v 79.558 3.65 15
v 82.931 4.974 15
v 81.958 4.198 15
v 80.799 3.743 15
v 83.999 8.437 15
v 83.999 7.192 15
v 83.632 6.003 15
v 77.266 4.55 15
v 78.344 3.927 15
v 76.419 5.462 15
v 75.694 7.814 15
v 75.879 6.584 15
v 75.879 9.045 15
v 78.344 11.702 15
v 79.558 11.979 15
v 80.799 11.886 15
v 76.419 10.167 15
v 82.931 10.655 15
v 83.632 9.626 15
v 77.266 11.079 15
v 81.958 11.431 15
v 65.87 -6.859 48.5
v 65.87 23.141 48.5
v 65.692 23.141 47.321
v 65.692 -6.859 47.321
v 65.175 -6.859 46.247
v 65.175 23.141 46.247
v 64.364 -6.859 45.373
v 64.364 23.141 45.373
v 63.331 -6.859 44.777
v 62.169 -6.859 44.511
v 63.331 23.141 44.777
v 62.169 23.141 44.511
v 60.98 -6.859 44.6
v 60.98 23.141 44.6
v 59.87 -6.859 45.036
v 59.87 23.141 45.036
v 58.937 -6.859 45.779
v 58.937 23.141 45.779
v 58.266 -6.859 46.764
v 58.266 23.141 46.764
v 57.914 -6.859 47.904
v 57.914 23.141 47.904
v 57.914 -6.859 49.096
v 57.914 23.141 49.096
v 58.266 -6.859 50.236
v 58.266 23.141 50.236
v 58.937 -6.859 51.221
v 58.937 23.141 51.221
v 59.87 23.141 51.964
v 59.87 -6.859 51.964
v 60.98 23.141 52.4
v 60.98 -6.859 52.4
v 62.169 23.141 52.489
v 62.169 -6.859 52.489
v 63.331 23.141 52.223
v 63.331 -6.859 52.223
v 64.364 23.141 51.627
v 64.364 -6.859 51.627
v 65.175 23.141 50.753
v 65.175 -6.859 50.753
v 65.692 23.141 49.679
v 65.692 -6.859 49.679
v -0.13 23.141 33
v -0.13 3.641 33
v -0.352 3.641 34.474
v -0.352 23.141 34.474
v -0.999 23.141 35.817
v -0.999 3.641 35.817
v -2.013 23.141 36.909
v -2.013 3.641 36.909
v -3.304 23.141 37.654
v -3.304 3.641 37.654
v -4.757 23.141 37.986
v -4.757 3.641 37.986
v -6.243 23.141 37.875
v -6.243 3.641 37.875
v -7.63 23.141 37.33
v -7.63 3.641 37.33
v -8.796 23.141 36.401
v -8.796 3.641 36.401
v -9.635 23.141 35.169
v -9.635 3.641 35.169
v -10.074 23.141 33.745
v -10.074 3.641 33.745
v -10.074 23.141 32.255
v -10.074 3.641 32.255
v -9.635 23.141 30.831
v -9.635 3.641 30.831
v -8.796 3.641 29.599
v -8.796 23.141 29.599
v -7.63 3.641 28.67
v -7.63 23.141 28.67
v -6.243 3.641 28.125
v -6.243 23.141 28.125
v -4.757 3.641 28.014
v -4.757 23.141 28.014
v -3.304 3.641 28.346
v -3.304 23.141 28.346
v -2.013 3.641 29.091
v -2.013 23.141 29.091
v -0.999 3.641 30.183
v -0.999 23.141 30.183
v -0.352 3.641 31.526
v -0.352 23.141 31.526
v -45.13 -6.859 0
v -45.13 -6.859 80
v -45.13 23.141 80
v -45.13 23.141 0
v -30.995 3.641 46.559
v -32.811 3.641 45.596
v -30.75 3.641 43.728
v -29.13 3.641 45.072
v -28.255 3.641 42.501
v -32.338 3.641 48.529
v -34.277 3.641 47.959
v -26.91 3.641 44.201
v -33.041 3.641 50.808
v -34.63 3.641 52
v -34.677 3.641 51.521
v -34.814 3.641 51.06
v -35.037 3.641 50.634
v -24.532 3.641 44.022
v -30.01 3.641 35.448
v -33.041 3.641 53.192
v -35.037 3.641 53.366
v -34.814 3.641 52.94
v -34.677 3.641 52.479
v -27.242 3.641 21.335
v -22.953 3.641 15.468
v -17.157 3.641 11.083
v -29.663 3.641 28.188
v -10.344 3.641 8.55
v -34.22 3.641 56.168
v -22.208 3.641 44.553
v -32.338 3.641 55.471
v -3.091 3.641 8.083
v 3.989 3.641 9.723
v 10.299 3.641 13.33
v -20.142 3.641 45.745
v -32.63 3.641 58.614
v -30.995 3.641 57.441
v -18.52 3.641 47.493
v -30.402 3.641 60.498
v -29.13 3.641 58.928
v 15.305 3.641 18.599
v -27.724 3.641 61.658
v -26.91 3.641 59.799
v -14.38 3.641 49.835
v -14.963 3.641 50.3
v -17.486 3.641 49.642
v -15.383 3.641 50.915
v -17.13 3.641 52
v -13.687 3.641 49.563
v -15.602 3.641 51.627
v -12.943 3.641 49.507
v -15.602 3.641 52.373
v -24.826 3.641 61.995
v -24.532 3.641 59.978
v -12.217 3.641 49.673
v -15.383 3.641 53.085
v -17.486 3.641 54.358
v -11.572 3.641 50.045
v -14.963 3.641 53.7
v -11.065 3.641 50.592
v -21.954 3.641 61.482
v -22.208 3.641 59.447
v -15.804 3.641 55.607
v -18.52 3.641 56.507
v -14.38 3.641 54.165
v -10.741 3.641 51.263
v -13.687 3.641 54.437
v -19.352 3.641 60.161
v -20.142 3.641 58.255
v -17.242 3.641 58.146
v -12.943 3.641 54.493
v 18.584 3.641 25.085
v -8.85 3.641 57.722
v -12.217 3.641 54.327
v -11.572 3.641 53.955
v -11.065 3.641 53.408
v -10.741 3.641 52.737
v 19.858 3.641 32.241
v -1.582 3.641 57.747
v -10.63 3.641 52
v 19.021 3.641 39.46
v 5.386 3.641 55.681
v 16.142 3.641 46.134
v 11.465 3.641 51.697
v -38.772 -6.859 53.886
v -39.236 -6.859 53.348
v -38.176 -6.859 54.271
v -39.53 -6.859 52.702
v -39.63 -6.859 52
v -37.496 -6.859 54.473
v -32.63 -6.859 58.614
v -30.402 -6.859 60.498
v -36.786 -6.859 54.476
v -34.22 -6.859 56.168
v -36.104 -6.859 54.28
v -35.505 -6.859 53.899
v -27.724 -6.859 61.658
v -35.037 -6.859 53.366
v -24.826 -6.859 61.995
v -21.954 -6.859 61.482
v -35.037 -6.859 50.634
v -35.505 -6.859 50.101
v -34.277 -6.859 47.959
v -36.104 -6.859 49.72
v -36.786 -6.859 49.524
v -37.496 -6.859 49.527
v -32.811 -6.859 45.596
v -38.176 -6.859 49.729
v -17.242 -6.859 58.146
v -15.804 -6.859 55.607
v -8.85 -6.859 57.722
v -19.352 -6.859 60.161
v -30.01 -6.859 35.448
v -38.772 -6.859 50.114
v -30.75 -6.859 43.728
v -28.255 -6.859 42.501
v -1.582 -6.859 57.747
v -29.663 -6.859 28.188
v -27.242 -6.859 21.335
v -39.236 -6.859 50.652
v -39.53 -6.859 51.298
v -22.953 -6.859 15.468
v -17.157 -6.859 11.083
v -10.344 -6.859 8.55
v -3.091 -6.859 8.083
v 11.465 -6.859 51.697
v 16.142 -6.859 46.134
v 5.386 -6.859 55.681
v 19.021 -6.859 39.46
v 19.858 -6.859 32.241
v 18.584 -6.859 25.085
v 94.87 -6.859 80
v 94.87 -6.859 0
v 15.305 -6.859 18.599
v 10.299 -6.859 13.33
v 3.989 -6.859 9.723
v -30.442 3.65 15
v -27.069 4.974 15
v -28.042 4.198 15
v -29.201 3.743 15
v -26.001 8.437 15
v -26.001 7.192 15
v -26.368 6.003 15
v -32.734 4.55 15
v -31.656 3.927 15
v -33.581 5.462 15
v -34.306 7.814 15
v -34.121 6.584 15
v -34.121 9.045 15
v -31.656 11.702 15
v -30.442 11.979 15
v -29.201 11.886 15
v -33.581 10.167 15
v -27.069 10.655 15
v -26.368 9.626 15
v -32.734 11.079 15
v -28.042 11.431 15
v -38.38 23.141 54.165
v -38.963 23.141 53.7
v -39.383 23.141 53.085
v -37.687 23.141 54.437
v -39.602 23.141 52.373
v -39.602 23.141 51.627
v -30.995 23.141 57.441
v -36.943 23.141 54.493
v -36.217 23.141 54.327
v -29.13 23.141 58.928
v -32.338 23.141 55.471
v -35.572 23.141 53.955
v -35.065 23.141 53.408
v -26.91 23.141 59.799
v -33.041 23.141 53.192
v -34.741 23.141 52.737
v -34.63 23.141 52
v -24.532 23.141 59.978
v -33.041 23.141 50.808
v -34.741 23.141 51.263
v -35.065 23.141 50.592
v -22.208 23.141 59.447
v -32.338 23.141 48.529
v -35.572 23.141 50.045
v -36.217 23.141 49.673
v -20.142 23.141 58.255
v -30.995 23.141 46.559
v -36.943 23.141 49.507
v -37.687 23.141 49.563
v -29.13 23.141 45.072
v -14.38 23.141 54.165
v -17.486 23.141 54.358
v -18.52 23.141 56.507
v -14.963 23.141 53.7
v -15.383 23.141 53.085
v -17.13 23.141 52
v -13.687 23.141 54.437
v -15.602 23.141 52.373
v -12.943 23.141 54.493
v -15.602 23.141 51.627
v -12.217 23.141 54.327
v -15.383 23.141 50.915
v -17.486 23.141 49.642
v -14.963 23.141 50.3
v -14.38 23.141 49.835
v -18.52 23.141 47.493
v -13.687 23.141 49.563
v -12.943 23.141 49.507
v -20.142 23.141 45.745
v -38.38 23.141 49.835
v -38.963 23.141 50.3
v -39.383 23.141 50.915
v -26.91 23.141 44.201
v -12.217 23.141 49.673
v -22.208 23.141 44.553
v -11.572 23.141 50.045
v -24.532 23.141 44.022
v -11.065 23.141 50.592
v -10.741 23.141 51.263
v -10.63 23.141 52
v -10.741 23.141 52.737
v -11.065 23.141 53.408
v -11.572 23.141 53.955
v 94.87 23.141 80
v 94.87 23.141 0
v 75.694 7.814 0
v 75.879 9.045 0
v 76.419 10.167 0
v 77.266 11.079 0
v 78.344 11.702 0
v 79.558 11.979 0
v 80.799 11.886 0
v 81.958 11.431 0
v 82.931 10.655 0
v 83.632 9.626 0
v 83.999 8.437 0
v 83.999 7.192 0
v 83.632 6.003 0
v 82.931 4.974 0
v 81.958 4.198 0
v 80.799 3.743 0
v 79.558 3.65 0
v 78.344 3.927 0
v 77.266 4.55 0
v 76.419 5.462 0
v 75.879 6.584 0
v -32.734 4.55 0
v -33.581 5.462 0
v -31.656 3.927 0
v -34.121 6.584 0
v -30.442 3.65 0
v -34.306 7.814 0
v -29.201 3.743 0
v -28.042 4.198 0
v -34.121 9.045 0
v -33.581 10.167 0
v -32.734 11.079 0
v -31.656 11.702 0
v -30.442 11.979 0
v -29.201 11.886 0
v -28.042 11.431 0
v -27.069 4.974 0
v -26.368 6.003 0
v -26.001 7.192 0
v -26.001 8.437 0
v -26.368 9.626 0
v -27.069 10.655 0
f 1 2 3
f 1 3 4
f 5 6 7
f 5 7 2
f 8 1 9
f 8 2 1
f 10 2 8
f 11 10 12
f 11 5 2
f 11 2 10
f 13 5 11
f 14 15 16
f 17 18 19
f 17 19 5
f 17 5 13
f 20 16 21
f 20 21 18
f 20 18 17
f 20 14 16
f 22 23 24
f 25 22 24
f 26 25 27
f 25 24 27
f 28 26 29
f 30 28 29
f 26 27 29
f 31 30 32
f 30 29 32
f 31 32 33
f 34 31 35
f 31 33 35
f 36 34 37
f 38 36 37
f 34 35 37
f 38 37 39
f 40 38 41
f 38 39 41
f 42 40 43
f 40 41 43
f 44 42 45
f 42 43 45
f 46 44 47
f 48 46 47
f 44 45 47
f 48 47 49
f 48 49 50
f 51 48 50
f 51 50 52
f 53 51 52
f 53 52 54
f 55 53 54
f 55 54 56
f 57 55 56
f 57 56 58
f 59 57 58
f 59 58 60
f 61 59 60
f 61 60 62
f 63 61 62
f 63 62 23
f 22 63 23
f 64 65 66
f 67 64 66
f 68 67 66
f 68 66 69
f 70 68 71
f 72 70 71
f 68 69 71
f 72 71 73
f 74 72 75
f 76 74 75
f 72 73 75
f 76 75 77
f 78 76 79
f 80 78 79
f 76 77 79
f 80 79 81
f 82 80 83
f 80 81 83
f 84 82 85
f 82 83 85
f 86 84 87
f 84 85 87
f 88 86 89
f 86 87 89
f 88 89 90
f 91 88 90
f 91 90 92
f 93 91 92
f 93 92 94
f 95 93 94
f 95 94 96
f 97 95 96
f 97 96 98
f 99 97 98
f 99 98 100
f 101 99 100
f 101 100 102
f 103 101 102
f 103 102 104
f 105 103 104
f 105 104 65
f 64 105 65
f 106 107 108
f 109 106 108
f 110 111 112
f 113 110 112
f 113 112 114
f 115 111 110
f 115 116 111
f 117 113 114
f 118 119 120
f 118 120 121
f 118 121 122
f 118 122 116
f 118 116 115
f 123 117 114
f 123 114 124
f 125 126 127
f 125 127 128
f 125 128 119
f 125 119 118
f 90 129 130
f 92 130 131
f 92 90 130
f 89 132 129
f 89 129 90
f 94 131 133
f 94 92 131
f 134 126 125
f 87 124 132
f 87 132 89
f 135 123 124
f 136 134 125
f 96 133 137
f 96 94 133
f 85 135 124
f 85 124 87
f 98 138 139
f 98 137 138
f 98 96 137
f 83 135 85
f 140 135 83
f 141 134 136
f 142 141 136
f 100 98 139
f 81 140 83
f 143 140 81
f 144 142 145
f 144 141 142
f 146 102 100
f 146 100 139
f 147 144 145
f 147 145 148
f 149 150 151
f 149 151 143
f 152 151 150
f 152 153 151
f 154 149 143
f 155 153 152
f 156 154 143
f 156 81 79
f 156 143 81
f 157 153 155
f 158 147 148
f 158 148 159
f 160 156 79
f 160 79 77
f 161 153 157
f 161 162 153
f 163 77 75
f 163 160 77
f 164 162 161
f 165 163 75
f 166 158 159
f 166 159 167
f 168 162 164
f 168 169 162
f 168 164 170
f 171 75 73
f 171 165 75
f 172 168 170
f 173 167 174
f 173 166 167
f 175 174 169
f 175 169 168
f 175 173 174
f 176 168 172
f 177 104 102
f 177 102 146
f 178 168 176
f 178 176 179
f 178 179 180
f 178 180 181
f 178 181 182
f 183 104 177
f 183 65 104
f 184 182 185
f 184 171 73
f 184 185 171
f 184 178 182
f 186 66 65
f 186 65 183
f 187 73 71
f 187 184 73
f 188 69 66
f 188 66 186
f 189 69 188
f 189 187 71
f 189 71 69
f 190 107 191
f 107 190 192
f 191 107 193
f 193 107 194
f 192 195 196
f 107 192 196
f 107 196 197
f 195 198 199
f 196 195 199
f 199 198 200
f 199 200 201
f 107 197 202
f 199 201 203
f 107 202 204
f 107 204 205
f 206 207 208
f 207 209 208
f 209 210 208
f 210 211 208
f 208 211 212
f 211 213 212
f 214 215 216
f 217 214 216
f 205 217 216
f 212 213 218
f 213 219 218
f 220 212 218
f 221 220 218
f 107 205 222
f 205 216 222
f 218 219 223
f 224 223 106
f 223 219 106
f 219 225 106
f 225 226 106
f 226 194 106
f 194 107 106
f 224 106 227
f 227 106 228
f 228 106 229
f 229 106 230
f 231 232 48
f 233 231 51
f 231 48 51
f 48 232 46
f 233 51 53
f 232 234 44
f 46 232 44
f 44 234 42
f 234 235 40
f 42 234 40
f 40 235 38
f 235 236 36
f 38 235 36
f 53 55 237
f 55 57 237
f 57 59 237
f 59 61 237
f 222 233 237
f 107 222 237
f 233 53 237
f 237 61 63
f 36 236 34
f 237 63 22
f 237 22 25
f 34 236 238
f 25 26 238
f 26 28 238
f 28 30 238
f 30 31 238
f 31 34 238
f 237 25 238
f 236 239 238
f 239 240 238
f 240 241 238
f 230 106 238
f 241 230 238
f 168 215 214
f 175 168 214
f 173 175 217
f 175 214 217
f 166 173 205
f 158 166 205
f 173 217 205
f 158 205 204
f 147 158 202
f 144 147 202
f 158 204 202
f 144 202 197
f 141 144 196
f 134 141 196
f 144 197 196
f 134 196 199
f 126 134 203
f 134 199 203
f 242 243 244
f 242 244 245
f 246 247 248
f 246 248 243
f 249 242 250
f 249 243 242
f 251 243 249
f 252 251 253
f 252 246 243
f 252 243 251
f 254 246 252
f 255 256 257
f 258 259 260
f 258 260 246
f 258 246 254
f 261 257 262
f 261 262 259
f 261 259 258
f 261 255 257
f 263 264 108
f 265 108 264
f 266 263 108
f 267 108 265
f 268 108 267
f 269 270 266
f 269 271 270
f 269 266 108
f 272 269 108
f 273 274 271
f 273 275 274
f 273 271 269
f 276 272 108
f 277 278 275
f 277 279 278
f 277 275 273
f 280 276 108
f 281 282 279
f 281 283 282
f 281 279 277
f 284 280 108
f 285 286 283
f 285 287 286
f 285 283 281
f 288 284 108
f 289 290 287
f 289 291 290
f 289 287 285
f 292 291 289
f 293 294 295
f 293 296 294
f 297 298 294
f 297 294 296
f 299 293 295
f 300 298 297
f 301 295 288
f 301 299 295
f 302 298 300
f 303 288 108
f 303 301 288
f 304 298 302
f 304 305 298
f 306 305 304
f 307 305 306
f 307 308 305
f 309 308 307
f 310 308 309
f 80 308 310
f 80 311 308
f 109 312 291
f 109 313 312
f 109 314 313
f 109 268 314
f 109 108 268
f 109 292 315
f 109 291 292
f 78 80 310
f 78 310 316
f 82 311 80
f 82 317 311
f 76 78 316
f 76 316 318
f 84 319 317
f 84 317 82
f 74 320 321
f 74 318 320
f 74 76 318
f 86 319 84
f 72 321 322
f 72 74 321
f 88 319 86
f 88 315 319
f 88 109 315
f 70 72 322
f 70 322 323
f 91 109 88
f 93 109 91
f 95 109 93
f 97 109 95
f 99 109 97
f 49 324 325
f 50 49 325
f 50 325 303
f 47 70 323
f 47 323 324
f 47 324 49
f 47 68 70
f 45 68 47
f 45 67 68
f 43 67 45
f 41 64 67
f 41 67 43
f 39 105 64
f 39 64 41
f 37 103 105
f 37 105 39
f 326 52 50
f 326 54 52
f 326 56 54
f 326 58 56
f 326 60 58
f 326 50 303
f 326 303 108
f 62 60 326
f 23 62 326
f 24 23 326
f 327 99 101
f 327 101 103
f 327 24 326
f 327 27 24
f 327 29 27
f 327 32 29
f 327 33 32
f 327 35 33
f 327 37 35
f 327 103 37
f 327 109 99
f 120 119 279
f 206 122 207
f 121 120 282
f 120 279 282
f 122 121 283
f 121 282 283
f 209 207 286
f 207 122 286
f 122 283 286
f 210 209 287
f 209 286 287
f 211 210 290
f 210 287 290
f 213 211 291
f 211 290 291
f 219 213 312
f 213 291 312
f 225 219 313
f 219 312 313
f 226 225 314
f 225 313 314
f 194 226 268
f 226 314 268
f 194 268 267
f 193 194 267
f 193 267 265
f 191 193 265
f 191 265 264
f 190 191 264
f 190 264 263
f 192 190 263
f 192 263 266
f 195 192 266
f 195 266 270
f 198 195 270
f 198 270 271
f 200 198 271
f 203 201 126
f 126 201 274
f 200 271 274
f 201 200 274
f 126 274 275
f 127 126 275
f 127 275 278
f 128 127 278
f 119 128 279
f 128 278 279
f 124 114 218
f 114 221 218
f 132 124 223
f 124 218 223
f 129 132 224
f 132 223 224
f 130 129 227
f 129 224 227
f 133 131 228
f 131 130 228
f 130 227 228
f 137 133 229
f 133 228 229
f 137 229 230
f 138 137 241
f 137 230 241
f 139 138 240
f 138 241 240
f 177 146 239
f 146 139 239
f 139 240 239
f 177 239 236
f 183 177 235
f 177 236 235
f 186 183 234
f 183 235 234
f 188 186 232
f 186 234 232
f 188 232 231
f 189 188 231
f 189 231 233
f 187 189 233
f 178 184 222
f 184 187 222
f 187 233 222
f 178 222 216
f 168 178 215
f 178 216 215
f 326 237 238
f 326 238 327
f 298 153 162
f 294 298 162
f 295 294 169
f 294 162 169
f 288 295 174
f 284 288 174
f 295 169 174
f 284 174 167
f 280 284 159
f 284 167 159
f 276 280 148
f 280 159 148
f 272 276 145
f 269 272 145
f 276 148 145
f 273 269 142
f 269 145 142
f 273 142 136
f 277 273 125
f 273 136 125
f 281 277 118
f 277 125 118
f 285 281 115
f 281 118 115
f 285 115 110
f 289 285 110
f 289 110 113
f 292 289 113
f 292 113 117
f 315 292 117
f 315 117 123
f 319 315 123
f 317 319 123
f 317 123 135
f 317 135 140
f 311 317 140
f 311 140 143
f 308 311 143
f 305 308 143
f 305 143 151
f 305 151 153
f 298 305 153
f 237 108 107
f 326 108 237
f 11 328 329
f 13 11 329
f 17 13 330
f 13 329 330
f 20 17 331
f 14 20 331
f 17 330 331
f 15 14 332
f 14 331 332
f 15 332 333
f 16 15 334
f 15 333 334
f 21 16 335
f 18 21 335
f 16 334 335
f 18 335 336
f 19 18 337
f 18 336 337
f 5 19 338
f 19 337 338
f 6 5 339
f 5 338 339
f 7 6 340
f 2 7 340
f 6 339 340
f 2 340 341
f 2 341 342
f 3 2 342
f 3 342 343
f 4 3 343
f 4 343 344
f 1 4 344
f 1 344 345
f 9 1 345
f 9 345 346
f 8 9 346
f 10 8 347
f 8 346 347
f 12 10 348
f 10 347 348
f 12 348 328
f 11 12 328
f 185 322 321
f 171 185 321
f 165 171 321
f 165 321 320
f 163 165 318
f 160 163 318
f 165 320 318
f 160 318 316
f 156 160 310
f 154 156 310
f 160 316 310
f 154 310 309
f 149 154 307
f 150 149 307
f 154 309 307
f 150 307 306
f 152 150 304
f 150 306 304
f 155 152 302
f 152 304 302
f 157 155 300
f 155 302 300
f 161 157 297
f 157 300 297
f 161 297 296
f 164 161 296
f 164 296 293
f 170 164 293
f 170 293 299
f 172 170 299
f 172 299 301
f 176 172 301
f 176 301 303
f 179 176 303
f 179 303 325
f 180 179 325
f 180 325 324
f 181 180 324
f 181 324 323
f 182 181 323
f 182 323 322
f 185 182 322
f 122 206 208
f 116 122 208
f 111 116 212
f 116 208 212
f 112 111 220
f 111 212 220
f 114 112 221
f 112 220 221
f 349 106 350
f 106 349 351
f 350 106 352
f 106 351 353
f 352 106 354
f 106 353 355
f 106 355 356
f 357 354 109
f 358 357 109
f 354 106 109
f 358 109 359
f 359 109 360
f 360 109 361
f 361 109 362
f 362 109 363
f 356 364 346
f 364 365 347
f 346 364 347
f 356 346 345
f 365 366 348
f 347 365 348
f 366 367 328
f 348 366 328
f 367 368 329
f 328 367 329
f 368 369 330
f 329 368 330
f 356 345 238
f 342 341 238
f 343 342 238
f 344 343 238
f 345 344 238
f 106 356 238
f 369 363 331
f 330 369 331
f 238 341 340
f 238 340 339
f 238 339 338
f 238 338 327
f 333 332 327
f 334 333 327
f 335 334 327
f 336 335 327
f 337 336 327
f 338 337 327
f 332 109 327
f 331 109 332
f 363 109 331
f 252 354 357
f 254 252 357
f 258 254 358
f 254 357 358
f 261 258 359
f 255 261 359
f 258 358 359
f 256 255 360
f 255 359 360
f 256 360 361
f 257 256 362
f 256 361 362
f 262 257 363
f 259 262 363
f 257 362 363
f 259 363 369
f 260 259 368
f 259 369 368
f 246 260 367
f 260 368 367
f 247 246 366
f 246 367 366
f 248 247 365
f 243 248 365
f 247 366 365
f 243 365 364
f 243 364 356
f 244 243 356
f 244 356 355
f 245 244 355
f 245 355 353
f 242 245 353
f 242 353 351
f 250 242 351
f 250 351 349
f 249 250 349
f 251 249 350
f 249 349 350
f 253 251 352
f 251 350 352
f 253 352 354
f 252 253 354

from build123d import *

# Parameters (mm, degrees)
SKETCH1_W                = 140
SKETCH1_H                = 30
BOSS_EXTRUDE1_DEPTH      = 80
SKETCH2_R                = 4.17592015
CUT_EXTRUDE1_DEPTH       = 15
LPATTERN1_COUNT          = 4
LPATTERN1_PITCH          = 110
SKETCH_1_R               = 25
CUT_EXTRUDE_1_DEPTH      = 10.5
SKETCH_2_R               = 5
CUT_EXTRUDE_2_DEPTH      = 10
CUT_EXTRUDE_2_DEPTH_BACK = 100
SKETCH_3_R               = 8
CUT_EXTRUDE_3_DEPTH      = 100
SKETCH_4_R               = 10
CUT_EXTRUDE_4_DEPTH      = 10.5
SKETCH_5_R               = 2.5
CUT_EXTRUDE_5_DEPTH      = 100
PATTERN_LINEAR_1_COUNT   = 2
PATTERN_LINEAR_1_PITCH   = 24
SKETCH_6_R               = 4
CUT_EXTRUDE_6_DEPTH      = 100


with BuildPart() as part:
    # Sketch1 → Boss-Extrude1 (new body)
    with BuildSketch(Plane.XY):
        with Locations((24.869684499, 8.141289438)):
            Rectangle(SKETCH1_W, SKETCH1_H)
    extrude(amount=BOSS_EXTRUDE1_DEPTH)

    # Sketch2 → Cut-Extrude1 (cut)
    with BuildSketch(Plane(origin=(0, 0, 0), x_dir=(-1, 0, 0), z_dir=(0, 0, -1))):
        with Locations((30.130315501, 7.814471991)):
            Circle(SKETCH2_R)
    cut_extrude1 = extrude(amount=-CUT_EXTRUDE1_DEPTH, mode=Mode.SUBTRACT)

    # LPattern1: Cut-Extrude1 ×4
    with Locations(*[(i * LPATTERN1_PITCH, 0, 0) for i in range(1, LPATTERN1_COUNT)]):
        add(cut_extrude1, mode=Mode.SUBTRACT)

    # Эскиз1 → Вырез-Вытянуть1 (cut)
    with BuildSketch(Plane.XZ.offset(6.858710562)):
        with Locations((-5.130315501, 33)):
            Circle(SKETCH_1_R)
    extrude(amount=-CUT_EXTRUDE_1_DEPTH, mode=Mode.SUBTRACT)

    # Эскиз2 → Вырез-Вытянуть2 (cut, two sides)
    with BuildSketch(Plane.XZ.offset(-3.641289438)) as cut_extrude_2_sk:
        with Locations((-5.130315501, 33)):
            Circle(SKETCH_2_R)
    extrude(amount=CUT_EXTRUDE_2_DEPTH, mode=Mode.SUBTRACT)
    extrude(cut_extrude_2_sk.sketch, amount=-CUT_EXTRUDE_2_DEPTH_BACK, mode=Mode.SUBTRACT)

    # Эскиз3 → Вырез-Вытянуть3 (cut)
    with BuildSketch(Plane.XZ.offset(6.858710562)):
        with Locations((-25.130315501, 52)):
            Circle(SKETCH_3_R)
    extrude(amount=-CUT_EXTRUDE_3_DEPTH, mode=Mode.SUBTRACT)

    # Эскиз4 → Вырез-Вытянуть4 (cut)
    with BuildSketch(Plane.XZ.offset(6.858710562)):
        with Locations((-25.130315501, 52)):
            Circle(SKETCH_4_R)
    extrude(amount=-CUT_EXTRUDE_4_DEPTH, mode=Mode.SUBTRACT)

    # Эскиз5 → Вырез-Вытянуть5 (cut)
    with BuildSketch(Plane(origin=(0, 23.141289438, 0), x_dir=(1, 0, 0), z_dir=(0, 1, 0))):
        with Locations((-37.130315501, -52)):
            Circle(SKETCH_5_R)
    cut_extrude_5 = extrude(amount=-CUT_EXTRUDE_5_DEPTH, mode=Mode.SUBTRACT)

    # Линейный массив1: Вырез-Вытянуть5 ×2
    with Locations(*[(i * PATTERN_LINEAR_1_PITCH, 0, 0) for i in range(1, PATTERN_LINEAR_1_COUNT)]):
        add(cut_extrude_5, mode=Mode.SUBTRACT)

    # Эскиз6 → Вырез-Вытянуть6 (cut)
    with BuildSketch(Plane(origin=(0, 23.141289438, 0), x_dir=(1, 0, 0), z_dir=(0, 1, 0))):
        with Locations((61.869684499, -48.5)):
            Circle(SKETCH_6_R)
    extrude(amount=-CUT_EXTRUDE_6_DEPTH, mode=Mode.SUBTRACT)


solid = part.part
